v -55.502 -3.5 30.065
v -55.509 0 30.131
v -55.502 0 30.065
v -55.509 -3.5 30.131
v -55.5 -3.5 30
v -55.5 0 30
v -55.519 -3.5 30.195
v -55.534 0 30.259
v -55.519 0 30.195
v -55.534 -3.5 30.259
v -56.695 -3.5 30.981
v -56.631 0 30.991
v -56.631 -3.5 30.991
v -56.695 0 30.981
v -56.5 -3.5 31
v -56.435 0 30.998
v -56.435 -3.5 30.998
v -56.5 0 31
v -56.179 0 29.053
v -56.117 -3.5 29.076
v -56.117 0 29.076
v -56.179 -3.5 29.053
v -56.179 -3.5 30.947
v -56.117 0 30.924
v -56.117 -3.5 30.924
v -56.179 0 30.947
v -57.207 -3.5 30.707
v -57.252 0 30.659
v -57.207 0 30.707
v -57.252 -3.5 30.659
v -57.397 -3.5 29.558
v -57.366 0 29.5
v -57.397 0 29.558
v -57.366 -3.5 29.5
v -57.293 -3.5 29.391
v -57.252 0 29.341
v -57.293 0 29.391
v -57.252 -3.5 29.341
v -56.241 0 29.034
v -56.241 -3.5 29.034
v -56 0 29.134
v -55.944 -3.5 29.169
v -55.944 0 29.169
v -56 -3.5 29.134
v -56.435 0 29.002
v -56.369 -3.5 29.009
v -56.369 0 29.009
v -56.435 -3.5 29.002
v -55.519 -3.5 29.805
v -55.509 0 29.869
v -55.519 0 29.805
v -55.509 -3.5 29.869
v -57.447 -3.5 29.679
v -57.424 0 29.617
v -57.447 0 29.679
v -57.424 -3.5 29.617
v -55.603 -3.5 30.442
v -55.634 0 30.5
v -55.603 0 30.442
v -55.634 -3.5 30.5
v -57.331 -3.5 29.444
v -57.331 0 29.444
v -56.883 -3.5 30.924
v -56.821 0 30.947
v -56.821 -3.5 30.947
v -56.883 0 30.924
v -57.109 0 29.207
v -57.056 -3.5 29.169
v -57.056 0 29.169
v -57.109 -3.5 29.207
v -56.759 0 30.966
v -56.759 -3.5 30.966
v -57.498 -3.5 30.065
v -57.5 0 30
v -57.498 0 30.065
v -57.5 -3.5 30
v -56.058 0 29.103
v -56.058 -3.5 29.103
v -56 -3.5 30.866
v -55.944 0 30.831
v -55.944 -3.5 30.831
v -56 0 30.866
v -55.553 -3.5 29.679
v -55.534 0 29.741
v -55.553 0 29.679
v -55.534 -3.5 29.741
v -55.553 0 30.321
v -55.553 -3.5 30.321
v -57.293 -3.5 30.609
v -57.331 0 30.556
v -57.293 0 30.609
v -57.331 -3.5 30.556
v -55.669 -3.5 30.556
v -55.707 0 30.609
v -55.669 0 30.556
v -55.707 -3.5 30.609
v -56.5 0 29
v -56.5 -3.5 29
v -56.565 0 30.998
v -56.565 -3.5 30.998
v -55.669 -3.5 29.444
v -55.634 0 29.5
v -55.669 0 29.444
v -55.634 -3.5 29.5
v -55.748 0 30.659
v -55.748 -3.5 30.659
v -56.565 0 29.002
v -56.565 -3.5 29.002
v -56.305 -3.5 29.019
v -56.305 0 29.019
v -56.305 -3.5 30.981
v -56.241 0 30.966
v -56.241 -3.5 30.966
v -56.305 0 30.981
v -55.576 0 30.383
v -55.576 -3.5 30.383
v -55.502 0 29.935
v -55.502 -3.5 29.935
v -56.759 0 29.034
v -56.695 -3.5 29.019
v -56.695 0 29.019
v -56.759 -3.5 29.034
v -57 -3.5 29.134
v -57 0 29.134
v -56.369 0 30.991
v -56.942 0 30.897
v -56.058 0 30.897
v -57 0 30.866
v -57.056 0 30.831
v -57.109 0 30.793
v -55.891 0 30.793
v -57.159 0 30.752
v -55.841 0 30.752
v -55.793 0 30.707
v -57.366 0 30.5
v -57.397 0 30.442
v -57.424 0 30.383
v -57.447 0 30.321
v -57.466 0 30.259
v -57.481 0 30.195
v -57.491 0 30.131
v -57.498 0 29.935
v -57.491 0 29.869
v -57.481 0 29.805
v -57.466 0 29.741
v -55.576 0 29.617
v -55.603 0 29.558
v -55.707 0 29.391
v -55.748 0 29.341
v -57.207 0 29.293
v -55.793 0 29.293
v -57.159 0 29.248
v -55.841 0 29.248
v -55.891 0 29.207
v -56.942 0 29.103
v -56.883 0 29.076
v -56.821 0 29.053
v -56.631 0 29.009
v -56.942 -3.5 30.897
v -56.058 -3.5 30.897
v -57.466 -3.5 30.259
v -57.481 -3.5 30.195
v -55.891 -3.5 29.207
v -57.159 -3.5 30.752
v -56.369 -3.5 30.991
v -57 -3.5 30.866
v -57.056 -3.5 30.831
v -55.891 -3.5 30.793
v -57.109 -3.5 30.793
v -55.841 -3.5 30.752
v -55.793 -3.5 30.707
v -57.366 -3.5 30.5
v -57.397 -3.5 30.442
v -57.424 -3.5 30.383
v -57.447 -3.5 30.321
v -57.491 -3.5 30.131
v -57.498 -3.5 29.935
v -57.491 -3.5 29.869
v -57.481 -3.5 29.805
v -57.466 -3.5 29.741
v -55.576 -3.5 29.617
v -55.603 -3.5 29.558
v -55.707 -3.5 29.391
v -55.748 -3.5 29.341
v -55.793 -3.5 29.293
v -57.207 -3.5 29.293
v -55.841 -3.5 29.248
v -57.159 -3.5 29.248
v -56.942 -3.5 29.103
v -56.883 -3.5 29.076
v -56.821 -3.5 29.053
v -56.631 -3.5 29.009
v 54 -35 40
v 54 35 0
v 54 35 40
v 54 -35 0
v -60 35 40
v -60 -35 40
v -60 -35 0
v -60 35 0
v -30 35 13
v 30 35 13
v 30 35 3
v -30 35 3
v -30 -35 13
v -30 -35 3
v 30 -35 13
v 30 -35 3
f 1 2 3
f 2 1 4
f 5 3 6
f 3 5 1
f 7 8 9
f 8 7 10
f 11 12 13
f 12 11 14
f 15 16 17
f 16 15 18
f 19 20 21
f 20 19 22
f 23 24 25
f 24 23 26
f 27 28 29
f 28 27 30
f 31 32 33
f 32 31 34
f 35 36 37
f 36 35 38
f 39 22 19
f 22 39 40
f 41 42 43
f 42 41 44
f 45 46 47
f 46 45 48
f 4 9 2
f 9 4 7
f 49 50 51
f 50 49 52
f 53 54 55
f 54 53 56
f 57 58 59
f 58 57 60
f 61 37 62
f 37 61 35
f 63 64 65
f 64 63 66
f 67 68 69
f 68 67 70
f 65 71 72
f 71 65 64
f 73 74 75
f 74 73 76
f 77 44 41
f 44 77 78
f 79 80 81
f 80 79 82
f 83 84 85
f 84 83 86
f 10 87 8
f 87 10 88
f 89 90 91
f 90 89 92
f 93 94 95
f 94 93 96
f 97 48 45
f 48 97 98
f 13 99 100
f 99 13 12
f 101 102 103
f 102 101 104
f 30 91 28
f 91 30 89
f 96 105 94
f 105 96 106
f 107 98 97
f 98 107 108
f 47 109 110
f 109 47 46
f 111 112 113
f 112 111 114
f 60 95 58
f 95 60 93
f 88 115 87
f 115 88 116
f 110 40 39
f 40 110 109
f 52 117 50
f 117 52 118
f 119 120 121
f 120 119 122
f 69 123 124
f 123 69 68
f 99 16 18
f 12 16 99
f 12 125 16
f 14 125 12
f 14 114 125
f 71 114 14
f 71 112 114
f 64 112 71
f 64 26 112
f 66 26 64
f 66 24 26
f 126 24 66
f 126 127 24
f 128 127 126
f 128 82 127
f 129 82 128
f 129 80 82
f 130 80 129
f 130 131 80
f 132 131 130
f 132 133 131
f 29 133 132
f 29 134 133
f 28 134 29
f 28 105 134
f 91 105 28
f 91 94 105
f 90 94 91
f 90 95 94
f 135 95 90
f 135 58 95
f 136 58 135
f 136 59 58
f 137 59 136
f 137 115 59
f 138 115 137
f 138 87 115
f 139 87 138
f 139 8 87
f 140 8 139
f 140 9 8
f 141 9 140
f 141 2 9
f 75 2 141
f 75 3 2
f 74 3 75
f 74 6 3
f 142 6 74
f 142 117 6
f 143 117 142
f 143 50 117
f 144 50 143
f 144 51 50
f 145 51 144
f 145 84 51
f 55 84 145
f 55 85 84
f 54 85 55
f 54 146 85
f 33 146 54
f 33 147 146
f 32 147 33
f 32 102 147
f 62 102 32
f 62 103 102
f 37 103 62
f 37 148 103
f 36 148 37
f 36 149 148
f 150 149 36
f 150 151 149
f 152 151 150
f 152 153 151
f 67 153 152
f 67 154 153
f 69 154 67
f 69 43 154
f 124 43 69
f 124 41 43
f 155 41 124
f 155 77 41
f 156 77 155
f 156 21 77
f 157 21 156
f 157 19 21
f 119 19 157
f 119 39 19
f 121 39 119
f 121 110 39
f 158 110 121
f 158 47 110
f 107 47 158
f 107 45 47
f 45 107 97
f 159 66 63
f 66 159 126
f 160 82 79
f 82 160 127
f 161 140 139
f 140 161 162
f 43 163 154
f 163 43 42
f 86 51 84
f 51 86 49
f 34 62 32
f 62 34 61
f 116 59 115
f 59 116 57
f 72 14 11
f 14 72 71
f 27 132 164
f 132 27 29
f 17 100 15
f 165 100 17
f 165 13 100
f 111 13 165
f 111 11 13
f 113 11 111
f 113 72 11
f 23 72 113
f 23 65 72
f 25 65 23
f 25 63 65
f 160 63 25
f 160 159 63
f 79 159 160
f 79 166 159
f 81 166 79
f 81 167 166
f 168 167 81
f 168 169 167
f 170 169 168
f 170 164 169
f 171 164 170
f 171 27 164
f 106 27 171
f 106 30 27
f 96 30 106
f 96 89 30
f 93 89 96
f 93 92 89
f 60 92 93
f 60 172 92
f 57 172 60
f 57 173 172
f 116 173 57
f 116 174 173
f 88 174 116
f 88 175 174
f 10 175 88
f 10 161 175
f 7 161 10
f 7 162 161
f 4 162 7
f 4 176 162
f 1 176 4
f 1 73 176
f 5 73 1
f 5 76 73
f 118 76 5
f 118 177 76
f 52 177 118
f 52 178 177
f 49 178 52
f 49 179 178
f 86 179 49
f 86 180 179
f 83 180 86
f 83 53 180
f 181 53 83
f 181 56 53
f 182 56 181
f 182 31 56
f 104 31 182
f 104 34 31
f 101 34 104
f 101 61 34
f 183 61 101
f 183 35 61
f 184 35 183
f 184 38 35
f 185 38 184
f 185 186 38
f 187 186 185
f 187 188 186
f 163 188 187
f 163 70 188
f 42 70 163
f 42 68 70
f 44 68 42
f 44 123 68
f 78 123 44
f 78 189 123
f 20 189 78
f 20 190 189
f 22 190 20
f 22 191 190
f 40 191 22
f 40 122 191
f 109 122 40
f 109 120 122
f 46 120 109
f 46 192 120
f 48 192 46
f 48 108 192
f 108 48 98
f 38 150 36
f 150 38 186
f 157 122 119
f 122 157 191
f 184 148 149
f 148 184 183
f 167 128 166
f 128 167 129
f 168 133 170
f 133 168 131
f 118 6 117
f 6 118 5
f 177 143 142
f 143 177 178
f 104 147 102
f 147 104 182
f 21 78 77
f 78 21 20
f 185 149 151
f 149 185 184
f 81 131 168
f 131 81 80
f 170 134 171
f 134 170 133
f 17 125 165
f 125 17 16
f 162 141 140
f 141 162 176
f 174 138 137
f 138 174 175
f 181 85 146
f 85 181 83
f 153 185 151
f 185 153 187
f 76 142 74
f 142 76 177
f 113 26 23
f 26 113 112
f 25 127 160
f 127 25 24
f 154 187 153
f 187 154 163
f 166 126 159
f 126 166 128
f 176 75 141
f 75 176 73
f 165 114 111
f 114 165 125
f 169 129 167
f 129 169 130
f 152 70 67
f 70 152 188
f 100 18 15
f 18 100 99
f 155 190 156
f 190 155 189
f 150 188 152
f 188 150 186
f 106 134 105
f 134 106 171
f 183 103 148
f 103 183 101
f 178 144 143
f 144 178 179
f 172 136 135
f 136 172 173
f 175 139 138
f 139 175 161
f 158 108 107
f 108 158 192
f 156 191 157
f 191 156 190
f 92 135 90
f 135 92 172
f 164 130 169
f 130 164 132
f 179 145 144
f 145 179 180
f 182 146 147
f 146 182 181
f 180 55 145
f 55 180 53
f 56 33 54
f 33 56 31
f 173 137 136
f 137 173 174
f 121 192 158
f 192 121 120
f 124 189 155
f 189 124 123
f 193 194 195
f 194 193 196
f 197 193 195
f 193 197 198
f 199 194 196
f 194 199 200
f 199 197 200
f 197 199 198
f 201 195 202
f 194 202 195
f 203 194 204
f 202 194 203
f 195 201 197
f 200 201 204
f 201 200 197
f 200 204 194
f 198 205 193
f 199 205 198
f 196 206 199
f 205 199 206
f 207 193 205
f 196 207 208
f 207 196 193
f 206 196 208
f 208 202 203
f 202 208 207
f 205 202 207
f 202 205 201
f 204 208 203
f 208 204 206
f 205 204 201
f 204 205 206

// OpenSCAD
// Mini horizontal gel-electrophoresis box - buffer tank
// Print orientation: base on XY plane, open top facing +Z

// ---- Tank dimensions ----
outer_x = 120;   // outer length along X
outer_y = 70;    // outer width along Y (inner width)
height  = 40;    // overall height along Z
wall    = 3;     // wall thickness
floor   = 3;     // floor thickness

// ---- Platform ----
plat_len   = 60; // platform length along X
plat_top_z = 13; // top of platform (10 mm above inner floor)

// ---- Holes ----
hole_d     = 2;  // electrode wire hole diameter
hole_y     = 0;  // hole Y position
hole_z     = 30; // hole Z position

// ---- Modelling ----
eps = 0.5;       // cutter overshoot
$fn = 96;

inner_x = outer_x - 2*wall;

difference() {
    // Tank body
    translate([-outer_x/2, -outer_y/2, 0])
        cube([inner_x, outer_y, height]);

    // Raised platform
    translate([-plat_len/2, -outer_y/2, floor])
        cube([plat_len, outer_y, plat_top_z - floor]);

    // Electrode holes
    for (sx = [-1, 1])
        translate([sx * (inner_x/2 - eps), hole_y, hole_z])
            rotate([90, 0, 0])
                cylinder(d = hole_d, h = wall + eps);
}
